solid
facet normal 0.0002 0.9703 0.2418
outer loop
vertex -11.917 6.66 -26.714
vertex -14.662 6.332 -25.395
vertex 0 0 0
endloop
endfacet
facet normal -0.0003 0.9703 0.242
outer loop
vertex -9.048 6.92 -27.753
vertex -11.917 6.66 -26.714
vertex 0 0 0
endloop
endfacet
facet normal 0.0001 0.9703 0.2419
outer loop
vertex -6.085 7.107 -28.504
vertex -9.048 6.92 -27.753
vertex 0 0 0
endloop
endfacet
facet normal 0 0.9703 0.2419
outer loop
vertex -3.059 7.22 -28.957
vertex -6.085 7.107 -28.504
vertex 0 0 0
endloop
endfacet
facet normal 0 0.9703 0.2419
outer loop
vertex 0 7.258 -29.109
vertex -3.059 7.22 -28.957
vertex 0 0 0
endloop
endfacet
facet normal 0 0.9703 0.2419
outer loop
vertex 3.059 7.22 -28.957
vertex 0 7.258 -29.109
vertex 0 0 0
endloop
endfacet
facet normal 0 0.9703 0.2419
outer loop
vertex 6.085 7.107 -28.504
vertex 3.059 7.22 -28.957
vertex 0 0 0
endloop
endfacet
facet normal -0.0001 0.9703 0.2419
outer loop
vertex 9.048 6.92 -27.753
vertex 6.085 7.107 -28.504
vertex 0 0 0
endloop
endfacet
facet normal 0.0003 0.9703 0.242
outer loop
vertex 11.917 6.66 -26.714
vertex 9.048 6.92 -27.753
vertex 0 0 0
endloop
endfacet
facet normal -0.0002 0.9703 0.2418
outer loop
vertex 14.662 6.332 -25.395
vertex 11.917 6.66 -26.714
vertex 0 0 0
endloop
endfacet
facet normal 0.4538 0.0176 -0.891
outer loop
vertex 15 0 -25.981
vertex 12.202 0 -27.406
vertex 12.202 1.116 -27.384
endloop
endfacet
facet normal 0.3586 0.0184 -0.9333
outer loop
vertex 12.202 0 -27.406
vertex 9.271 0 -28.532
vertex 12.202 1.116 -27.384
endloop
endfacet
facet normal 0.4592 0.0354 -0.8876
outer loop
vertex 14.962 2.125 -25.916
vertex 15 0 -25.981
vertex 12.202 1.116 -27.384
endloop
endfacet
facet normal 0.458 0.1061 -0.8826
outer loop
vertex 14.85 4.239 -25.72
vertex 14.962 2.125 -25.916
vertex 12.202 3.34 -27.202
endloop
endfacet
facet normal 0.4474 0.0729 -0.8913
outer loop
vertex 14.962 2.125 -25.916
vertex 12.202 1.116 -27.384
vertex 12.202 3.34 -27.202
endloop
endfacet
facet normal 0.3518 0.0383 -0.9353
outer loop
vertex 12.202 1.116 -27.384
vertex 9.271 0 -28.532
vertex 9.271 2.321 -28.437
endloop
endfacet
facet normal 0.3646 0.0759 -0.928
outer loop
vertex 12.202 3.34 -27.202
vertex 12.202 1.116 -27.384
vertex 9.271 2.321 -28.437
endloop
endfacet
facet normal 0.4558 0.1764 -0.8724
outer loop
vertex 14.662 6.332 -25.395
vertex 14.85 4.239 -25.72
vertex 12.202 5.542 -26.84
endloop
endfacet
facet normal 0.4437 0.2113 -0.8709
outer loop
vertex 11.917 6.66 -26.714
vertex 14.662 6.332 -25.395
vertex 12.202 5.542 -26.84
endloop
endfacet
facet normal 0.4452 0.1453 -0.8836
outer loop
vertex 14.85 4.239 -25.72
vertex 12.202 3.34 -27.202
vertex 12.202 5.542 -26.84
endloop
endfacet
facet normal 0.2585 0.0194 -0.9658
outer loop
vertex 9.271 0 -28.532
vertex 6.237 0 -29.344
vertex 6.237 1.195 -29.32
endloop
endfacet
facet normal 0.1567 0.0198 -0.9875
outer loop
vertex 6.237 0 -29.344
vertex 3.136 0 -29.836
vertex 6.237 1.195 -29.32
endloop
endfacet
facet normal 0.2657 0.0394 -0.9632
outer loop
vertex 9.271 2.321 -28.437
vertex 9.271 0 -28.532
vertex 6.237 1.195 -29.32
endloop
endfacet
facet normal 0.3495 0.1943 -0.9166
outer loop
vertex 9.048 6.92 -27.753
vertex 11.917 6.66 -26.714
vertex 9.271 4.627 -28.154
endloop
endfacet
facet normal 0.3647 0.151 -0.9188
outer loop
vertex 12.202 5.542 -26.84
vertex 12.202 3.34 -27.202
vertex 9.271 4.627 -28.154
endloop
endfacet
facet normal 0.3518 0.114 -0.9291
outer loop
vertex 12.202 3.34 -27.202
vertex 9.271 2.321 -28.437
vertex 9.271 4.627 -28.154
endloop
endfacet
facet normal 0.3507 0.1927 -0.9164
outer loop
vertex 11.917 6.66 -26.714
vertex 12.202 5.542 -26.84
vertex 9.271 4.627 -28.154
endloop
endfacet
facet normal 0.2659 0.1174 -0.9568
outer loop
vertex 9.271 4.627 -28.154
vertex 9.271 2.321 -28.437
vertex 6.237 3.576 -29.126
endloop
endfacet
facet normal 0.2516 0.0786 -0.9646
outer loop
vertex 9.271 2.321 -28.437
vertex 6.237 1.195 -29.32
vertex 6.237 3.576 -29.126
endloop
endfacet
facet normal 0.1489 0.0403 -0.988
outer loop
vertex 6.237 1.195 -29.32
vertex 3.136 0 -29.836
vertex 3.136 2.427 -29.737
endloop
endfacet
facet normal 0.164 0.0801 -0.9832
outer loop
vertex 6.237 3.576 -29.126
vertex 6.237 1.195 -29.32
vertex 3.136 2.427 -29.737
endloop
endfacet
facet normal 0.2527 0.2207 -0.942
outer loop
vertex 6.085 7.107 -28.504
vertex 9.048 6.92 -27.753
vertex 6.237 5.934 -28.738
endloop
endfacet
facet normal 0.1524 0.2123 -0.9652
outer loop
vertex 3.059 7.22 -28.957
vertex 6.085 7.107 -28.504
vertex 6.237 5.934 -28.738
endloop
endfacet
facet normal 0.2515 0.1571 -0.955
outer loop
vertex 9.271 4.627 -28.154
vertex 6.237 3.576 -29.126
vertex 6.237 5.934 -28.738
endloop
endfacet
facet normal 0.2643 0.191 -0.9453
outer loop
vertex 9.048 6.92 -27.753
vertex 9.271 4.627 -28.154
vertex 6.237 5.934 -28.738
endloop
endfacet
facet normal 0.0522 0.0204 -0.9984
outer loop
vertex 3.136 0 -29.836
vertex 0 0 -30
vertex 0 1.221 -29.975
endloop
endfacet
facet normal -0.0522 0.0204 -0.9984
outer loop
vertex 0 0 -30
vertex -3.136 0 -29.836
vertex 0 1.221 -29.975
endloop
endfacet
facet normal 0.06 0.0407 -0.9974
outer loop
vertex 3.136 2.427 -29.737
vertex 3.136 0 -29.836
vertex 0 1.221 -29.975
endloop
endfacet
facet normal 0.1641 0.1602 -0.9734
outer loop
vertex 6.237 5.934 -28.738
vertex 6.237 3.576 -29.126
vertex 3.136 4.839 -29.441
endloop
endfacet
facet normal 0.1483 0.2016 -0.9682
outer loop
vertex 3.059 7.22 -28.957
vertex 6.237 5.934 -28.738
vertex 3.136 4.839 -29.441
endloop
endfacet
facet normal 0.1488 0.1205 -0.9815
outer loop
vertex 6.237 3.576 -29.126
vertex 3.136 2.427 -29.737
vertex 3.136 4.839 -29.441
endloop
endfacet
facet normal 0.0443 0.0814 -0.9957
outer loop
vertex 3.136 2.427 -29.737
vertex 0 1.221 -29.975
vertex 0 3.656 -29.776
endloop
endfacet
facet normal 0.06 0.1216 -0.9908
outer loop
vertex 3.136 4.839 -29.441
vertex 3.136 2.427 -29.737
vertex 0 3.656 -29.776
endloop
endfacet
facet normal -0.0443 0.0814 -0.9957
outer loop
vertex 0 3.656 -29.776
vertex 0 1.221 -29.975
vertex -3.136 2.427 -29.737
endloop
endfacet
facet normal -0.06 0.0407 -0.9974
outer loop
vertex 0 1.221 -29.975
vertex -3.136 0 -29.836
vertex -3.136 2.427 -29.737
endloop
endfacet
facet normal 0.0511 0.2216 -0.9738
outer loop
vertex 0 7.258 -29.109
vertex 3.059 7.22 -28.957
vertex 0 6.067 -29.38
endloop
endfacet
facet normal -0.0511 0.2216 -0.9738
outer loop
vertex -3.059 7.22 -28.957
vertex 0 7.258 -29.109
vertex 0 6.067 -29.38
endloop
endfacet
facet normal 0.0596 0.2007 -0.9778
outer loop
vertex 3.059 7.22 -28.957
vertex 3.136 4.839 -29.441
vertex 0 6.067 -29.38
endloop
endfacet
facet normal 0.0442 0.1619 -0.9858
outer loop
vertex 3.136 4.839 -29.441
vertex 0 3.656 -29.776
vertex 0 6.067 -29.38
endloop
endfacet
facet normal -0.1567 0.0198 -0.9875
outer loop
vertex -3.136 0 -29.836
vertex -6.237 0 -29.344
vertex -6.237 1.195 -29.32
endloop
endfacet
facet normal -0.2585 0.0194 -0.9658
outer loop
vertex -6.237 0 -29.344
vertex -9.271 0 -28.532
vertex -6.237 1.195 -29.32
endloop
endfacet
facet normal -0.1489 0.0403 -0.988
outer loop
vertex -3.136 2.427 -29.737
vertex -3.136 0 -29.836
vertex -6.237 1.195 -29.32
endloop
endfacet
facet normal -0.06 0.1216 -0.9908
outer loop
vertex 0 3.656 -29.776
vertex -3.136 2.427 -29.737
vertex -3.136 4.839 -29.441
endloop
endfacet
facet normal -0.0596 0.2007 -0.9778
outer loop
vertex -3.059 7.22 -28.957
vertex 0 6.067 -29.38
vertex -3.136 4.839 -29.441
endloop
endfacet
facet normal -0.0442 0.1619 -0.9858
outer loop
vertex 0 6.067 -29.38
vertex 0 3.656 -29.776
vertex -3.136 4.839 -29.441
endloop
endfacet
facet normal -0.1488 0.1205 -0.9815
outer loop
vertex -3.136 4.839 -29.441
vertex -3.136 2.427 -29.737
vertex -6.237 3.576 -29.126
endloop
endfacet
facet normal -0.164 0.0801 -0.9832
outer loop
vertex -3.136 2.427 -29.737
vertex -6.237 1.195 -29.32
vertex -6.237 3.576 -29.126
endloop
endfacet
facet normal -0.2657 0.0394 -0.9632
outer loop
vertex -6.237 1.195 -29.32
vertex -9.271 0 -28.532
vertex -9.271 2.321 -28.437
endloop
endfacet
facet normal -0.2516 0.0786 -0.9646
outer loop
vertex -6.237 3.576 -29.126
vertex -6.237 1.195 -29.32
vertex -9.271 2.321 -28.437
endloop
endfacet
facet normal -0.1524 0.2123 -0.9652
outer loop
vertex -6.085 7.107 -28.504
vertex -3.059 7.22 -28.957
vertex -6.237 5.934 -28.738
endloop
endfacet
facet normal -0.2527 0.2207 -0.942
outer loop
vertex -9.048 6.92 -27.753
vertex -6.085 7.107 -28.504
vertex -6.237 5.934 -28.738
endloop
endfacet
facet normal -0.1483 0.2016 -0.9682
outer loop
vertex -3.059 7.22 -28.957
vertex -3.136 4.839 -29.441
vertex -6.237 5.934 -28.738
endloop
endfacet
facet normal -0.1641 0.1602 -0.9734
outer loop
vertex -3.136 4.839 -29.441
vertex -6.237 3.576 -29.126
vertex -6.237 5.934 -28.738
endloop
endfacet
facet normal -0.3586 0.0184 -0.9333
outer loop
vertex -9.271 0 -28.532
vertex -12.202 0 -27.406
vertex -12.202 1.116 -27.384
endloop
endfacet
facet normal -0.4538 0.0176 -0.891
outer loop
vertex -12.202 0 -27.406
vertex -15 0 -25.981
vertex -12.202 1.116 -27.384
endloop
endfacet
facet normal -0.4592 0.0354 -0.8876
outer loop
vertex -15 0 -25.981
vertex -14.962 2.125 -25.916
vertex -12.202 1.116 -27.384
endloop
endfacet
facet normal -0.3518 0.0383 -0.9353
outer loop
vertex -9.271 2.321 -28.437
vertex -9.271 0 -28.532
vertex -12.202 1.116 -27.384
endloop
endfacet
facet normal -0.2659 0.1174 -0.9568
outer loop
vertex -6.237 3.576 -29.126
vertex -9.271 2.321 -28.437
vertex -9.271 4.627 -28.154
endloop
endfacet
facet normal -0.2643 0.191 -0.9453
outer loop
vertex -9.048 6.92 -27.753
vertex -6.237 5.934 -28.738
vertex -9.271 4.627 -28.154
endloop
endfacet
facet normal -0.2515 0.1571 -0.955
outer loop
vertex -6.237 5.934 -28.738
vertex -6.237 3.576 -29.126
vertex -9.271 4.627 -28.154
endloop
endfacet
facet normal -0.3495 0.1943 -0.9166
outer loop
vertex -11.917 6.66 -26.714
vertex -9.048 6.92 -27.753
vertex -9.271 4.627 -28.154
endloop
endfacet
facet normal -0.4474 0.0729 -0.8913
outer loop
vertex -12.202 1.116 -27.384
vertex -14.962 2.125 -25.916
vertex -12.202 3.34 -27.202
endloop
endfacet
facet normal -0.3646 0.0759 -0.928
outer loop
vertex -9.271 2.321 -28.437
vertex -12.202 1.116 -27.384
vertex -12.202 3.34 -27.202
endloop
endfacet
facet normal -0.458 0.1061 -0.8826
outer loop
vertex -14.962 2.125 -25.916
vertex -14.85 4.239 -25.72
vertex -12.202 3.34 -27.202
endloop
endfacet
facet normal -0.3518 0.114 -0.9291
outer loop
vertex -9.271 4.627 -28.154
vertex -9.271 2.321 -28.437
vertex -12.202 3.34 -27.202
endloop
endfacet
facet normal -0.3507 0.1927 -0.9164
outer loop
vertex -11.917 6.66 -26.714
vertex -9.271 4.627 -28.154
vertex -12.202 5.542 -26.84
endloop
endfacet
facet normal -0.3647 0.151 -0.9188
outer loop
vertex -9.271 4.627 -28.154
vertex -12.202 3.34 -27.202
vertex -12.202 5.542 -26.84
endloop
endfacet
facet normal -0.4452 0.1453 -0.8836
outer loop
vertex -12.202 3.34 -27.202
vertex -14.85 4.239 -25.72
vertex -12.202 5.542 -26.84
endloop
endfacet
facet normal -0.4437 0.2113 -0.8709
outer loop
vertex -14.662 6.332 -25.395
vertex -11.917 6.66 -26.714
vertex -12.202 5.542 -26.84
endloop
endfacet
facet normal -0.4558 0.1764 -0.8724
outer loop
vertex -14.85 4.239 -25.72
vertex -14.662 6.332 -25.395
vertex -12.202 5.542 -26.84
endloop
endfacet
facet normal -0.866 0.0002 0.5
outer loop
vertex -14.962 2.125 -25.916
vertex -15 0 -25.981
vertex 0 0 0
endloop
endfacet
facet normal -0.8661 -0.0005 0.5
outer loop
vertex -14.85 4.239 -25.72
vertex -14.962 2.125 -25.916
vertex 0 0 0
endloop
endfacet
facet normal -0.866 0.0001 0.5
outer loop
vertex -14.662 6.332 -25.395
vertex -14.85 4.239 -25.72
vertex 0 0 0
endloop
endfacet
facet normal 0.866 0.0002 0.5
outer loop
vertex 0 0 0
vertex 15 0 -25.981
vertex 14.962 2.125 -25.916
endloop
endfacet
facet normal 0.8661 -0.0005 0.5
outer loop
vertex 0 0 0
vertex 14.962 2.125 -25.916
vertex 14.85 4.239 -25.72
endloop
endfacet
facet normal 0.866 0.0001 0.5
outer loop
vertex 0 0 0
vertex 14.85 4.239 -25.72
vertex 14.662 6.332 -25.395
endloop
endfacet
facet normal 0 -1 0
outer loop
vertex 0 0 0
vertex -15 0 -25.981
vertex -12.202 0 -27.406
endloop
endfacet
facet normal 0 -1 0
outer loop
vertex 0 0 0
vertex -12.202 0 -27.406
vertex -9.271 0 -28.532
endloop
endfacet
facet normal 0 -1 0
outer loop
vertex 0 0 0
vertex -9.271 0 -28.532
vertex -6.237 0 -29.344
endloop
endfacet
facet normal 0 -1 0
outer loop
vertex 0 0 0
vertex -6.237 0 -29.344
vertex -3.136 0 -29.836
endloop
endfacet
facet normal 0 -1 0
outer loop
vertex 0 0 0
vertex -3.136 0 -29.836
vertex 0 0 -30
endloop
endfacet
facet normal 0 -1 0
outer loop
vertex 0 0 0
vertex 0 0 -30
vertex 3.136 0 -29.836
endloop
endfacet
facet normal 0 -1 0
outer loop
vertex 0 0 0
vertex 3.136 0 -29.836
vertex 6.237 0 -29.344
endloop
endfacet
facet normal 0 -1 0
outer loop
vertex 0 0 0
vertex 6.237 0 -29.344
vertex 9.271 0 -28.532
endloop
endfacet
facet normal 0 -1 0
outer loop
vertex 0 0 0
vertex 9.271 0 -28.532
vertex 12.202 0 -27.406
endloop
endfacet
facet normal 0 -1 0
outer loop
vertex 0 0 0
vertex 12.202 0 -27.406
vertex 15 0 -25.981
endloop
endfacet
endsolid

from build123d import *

# Parameters (mm, degrees)
REVOLVE_2_ANGLE     = 14
SKETCH_5_W          = 44.686573774
SKETCH_5_H          = 93.829393492
CUT_EXTRUDE_1_DEPTH = 50
SKETCH_6_W          = 25.08892812
SKETCH_6_H          = 77.533839386
CUT_EXTRUDE_2_DEPTH = 39


with BuildPart() as part:
    # 草图3 → 旋转2 (revolve)
    with BuildSketch(Plane(origin=(0, 0, 0), x_dir=(1, 0, 0), z_dir=(0, 1, 0))):
        with BuildLine():
            Line((-30, 0), (30, 0))
            ThreePointArc((30, 0), (0, 30), (-30, 0))
        make_face()
    revolve(axis=Axis((-30, 0, 0), (1, 0, 0)), revolution_arc=REVOLVE_2_ANGLE)

    # 草图5 → 切除-拉伸1 (cut)
    with BuildSketch(Plane(origin=(0, 0, 0), x_dir=(0, 1, 0), z_dir=(-0.8660254037844416, 0, -0.49999999999999495))):
        Rectangle(SKETCH_5_W, SKETCH_5_H)
    extrude(amount=-CUT_EXTRUDE_1_DEPTH, mode=Mode.SUBTRACT)

    # 草图6 → 切除-拉伸2 (cut)
    with BuildSketch(Plane(origin=(0, 0, 0), x_dir=(0, 1, 0), z_dir=(-0.8660254037844416, 0, 0.49999999999999495))):
        Rectangle(SKETCH_6_W, SKETCH_6_H)
    extrude(amount=CUT_EXTRUDE_2_DEPTH, mode=Mode.SUBTRACT)


solid = part.part
